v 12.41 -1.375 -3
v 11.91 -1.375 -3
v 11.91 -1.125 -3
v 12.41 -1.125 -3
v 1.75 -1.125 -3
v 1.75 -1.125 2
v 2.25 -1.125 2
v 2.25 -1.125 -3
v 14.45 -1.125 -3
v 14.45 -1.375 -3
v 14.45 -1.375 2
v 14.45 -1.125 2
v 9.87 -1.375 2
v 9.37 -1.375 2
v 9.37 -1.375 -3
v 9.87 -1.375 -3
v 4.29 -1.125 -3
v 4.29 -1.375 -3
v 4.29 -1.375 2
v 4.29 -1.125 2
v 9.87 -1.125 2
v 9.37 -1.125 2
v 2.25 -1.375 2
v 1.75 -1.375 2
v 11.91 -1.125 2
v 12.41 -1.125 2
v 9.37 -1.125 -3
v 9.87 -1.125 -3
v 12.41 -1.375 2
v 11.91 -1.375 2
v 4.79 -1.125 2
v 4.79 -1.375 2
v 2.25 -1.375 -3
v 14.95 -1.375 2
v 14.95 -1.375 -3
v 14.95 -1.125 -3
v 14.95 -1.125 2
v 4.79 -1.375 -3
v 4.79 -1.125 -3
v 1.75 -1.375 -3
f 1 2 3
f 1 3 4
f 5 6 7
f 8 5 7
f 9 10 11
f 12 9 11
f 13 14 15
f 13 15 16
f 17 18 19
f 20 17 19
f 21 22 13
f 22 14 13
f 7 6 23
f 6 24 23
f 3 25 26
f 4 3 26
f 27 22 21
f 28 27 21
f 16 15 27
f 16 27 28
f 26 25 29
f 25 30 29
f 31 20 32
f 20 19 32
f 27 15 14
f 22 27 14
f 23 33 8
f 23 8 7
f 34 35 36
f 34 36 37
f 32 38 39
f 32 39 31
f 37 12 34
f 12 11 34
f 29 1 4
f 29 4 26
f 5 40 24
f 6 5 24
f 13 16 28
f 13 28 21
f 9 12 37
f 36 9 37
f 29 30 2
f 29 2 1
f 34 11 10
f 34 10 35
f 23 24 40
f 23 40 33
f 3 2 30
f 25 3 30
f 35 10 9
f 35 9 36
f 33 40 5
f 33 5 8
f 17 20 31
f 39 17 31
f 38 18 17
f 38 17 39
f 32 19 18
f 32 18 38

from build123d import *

# Parameters (mm, degrees)
SKETCH003_W  = 0.5
SKETCH003_H  = 5
PAD003_DEPTH = 0.125
SKETCH002_W  = 0.5
SKETCH002_H  = 5
PAD002_DEPTH = 0.125
SKETCH005_W  = 0.5
SKETCH005_H  = 5
PAD005_DEPTH = 0.125
SKETCH004_W  = 0.5
SKETCH004_H  = 5
PAD004_DEPTH = 0.125
SKETCH001_W  = 0.5
SKETCH001_H  = 5
PAD001_DEPTH = 0.125


with BuildPart() as pad003:
    # Sketch003 → Pad003 (new body, symmetric)
    with BuildSketch(Plane(origin=(9.62, -1.25, 0), x_dir=(1, 0, 0), z_dir=(0, -1, 0))):
        with Locations((0, -0.5)):
            Rectangle(SKETCH003_W, SKETCH003_H)
    extrude(amount=PAD003_DEPTH, both=True)


with BuildPart() as pad002:
    # Sketch002 → Pad002 (new body, symmetric)
    with BuildSketch(Plane(origin=(4.54, -1.25, 0), x_dir=(1, 0, 0), z_dir=(0, -1, 0))):
        with Locations((0, -0.5)):
            Rectangle(SKETCH002_W, SKETCH002_H)
    extrude(amount=PAD002_DEPTH, both=True)


with BuildPart() as pad005:
    # Sketch005 → Pad005 (new body, symmetric)
    with BuildSketch(Plane(origin=(14.7, -1.25, 0), x_dir=(1, 0, 0), z_dir=(0, -1, 0))):
        with Locations((0, -0.5)):
            Rectangle(SKETCH005_W, SKETCH005_H)
    extrude(amount=PAD005_DEPTH, both=True)


with BuildPart() as pad004:
    # Sketch004 → Pad004 (new body, symmetric)
    with BuildSketch(Plane(origin=(12.16, -1.25, 0), x_dir=(1, 0, 0), z_dir=(0, -1, 0))):
        with Locations((0, -0.5)):
            Rectangle(SKETCH004_W, SKETCH004_H)
    extrude(amount=PAD004_DEPTH, both=True)


with BuildPart() as fusion:
    # Sketch001 → Pad001 (new body, symmetric)
    with BuildSketch(Plane(origin=(2, -1.25, 0), x_dir=(1, 0, 0), z_dir=(0, -1, 0))):
        with Locations((0, -0.5)):
            Rectangle(SKETCH001_W, SKETCH001_H)
    extrude(amount=PAD001_DEPTH, both=True)

    # Fusion: union Pad003, Pad002, Pad005, Pad004
    add(pad003.part)
    add(pad002.part)
    add(pad005.part)
    add(pad004.part)


solid = fusion.part
